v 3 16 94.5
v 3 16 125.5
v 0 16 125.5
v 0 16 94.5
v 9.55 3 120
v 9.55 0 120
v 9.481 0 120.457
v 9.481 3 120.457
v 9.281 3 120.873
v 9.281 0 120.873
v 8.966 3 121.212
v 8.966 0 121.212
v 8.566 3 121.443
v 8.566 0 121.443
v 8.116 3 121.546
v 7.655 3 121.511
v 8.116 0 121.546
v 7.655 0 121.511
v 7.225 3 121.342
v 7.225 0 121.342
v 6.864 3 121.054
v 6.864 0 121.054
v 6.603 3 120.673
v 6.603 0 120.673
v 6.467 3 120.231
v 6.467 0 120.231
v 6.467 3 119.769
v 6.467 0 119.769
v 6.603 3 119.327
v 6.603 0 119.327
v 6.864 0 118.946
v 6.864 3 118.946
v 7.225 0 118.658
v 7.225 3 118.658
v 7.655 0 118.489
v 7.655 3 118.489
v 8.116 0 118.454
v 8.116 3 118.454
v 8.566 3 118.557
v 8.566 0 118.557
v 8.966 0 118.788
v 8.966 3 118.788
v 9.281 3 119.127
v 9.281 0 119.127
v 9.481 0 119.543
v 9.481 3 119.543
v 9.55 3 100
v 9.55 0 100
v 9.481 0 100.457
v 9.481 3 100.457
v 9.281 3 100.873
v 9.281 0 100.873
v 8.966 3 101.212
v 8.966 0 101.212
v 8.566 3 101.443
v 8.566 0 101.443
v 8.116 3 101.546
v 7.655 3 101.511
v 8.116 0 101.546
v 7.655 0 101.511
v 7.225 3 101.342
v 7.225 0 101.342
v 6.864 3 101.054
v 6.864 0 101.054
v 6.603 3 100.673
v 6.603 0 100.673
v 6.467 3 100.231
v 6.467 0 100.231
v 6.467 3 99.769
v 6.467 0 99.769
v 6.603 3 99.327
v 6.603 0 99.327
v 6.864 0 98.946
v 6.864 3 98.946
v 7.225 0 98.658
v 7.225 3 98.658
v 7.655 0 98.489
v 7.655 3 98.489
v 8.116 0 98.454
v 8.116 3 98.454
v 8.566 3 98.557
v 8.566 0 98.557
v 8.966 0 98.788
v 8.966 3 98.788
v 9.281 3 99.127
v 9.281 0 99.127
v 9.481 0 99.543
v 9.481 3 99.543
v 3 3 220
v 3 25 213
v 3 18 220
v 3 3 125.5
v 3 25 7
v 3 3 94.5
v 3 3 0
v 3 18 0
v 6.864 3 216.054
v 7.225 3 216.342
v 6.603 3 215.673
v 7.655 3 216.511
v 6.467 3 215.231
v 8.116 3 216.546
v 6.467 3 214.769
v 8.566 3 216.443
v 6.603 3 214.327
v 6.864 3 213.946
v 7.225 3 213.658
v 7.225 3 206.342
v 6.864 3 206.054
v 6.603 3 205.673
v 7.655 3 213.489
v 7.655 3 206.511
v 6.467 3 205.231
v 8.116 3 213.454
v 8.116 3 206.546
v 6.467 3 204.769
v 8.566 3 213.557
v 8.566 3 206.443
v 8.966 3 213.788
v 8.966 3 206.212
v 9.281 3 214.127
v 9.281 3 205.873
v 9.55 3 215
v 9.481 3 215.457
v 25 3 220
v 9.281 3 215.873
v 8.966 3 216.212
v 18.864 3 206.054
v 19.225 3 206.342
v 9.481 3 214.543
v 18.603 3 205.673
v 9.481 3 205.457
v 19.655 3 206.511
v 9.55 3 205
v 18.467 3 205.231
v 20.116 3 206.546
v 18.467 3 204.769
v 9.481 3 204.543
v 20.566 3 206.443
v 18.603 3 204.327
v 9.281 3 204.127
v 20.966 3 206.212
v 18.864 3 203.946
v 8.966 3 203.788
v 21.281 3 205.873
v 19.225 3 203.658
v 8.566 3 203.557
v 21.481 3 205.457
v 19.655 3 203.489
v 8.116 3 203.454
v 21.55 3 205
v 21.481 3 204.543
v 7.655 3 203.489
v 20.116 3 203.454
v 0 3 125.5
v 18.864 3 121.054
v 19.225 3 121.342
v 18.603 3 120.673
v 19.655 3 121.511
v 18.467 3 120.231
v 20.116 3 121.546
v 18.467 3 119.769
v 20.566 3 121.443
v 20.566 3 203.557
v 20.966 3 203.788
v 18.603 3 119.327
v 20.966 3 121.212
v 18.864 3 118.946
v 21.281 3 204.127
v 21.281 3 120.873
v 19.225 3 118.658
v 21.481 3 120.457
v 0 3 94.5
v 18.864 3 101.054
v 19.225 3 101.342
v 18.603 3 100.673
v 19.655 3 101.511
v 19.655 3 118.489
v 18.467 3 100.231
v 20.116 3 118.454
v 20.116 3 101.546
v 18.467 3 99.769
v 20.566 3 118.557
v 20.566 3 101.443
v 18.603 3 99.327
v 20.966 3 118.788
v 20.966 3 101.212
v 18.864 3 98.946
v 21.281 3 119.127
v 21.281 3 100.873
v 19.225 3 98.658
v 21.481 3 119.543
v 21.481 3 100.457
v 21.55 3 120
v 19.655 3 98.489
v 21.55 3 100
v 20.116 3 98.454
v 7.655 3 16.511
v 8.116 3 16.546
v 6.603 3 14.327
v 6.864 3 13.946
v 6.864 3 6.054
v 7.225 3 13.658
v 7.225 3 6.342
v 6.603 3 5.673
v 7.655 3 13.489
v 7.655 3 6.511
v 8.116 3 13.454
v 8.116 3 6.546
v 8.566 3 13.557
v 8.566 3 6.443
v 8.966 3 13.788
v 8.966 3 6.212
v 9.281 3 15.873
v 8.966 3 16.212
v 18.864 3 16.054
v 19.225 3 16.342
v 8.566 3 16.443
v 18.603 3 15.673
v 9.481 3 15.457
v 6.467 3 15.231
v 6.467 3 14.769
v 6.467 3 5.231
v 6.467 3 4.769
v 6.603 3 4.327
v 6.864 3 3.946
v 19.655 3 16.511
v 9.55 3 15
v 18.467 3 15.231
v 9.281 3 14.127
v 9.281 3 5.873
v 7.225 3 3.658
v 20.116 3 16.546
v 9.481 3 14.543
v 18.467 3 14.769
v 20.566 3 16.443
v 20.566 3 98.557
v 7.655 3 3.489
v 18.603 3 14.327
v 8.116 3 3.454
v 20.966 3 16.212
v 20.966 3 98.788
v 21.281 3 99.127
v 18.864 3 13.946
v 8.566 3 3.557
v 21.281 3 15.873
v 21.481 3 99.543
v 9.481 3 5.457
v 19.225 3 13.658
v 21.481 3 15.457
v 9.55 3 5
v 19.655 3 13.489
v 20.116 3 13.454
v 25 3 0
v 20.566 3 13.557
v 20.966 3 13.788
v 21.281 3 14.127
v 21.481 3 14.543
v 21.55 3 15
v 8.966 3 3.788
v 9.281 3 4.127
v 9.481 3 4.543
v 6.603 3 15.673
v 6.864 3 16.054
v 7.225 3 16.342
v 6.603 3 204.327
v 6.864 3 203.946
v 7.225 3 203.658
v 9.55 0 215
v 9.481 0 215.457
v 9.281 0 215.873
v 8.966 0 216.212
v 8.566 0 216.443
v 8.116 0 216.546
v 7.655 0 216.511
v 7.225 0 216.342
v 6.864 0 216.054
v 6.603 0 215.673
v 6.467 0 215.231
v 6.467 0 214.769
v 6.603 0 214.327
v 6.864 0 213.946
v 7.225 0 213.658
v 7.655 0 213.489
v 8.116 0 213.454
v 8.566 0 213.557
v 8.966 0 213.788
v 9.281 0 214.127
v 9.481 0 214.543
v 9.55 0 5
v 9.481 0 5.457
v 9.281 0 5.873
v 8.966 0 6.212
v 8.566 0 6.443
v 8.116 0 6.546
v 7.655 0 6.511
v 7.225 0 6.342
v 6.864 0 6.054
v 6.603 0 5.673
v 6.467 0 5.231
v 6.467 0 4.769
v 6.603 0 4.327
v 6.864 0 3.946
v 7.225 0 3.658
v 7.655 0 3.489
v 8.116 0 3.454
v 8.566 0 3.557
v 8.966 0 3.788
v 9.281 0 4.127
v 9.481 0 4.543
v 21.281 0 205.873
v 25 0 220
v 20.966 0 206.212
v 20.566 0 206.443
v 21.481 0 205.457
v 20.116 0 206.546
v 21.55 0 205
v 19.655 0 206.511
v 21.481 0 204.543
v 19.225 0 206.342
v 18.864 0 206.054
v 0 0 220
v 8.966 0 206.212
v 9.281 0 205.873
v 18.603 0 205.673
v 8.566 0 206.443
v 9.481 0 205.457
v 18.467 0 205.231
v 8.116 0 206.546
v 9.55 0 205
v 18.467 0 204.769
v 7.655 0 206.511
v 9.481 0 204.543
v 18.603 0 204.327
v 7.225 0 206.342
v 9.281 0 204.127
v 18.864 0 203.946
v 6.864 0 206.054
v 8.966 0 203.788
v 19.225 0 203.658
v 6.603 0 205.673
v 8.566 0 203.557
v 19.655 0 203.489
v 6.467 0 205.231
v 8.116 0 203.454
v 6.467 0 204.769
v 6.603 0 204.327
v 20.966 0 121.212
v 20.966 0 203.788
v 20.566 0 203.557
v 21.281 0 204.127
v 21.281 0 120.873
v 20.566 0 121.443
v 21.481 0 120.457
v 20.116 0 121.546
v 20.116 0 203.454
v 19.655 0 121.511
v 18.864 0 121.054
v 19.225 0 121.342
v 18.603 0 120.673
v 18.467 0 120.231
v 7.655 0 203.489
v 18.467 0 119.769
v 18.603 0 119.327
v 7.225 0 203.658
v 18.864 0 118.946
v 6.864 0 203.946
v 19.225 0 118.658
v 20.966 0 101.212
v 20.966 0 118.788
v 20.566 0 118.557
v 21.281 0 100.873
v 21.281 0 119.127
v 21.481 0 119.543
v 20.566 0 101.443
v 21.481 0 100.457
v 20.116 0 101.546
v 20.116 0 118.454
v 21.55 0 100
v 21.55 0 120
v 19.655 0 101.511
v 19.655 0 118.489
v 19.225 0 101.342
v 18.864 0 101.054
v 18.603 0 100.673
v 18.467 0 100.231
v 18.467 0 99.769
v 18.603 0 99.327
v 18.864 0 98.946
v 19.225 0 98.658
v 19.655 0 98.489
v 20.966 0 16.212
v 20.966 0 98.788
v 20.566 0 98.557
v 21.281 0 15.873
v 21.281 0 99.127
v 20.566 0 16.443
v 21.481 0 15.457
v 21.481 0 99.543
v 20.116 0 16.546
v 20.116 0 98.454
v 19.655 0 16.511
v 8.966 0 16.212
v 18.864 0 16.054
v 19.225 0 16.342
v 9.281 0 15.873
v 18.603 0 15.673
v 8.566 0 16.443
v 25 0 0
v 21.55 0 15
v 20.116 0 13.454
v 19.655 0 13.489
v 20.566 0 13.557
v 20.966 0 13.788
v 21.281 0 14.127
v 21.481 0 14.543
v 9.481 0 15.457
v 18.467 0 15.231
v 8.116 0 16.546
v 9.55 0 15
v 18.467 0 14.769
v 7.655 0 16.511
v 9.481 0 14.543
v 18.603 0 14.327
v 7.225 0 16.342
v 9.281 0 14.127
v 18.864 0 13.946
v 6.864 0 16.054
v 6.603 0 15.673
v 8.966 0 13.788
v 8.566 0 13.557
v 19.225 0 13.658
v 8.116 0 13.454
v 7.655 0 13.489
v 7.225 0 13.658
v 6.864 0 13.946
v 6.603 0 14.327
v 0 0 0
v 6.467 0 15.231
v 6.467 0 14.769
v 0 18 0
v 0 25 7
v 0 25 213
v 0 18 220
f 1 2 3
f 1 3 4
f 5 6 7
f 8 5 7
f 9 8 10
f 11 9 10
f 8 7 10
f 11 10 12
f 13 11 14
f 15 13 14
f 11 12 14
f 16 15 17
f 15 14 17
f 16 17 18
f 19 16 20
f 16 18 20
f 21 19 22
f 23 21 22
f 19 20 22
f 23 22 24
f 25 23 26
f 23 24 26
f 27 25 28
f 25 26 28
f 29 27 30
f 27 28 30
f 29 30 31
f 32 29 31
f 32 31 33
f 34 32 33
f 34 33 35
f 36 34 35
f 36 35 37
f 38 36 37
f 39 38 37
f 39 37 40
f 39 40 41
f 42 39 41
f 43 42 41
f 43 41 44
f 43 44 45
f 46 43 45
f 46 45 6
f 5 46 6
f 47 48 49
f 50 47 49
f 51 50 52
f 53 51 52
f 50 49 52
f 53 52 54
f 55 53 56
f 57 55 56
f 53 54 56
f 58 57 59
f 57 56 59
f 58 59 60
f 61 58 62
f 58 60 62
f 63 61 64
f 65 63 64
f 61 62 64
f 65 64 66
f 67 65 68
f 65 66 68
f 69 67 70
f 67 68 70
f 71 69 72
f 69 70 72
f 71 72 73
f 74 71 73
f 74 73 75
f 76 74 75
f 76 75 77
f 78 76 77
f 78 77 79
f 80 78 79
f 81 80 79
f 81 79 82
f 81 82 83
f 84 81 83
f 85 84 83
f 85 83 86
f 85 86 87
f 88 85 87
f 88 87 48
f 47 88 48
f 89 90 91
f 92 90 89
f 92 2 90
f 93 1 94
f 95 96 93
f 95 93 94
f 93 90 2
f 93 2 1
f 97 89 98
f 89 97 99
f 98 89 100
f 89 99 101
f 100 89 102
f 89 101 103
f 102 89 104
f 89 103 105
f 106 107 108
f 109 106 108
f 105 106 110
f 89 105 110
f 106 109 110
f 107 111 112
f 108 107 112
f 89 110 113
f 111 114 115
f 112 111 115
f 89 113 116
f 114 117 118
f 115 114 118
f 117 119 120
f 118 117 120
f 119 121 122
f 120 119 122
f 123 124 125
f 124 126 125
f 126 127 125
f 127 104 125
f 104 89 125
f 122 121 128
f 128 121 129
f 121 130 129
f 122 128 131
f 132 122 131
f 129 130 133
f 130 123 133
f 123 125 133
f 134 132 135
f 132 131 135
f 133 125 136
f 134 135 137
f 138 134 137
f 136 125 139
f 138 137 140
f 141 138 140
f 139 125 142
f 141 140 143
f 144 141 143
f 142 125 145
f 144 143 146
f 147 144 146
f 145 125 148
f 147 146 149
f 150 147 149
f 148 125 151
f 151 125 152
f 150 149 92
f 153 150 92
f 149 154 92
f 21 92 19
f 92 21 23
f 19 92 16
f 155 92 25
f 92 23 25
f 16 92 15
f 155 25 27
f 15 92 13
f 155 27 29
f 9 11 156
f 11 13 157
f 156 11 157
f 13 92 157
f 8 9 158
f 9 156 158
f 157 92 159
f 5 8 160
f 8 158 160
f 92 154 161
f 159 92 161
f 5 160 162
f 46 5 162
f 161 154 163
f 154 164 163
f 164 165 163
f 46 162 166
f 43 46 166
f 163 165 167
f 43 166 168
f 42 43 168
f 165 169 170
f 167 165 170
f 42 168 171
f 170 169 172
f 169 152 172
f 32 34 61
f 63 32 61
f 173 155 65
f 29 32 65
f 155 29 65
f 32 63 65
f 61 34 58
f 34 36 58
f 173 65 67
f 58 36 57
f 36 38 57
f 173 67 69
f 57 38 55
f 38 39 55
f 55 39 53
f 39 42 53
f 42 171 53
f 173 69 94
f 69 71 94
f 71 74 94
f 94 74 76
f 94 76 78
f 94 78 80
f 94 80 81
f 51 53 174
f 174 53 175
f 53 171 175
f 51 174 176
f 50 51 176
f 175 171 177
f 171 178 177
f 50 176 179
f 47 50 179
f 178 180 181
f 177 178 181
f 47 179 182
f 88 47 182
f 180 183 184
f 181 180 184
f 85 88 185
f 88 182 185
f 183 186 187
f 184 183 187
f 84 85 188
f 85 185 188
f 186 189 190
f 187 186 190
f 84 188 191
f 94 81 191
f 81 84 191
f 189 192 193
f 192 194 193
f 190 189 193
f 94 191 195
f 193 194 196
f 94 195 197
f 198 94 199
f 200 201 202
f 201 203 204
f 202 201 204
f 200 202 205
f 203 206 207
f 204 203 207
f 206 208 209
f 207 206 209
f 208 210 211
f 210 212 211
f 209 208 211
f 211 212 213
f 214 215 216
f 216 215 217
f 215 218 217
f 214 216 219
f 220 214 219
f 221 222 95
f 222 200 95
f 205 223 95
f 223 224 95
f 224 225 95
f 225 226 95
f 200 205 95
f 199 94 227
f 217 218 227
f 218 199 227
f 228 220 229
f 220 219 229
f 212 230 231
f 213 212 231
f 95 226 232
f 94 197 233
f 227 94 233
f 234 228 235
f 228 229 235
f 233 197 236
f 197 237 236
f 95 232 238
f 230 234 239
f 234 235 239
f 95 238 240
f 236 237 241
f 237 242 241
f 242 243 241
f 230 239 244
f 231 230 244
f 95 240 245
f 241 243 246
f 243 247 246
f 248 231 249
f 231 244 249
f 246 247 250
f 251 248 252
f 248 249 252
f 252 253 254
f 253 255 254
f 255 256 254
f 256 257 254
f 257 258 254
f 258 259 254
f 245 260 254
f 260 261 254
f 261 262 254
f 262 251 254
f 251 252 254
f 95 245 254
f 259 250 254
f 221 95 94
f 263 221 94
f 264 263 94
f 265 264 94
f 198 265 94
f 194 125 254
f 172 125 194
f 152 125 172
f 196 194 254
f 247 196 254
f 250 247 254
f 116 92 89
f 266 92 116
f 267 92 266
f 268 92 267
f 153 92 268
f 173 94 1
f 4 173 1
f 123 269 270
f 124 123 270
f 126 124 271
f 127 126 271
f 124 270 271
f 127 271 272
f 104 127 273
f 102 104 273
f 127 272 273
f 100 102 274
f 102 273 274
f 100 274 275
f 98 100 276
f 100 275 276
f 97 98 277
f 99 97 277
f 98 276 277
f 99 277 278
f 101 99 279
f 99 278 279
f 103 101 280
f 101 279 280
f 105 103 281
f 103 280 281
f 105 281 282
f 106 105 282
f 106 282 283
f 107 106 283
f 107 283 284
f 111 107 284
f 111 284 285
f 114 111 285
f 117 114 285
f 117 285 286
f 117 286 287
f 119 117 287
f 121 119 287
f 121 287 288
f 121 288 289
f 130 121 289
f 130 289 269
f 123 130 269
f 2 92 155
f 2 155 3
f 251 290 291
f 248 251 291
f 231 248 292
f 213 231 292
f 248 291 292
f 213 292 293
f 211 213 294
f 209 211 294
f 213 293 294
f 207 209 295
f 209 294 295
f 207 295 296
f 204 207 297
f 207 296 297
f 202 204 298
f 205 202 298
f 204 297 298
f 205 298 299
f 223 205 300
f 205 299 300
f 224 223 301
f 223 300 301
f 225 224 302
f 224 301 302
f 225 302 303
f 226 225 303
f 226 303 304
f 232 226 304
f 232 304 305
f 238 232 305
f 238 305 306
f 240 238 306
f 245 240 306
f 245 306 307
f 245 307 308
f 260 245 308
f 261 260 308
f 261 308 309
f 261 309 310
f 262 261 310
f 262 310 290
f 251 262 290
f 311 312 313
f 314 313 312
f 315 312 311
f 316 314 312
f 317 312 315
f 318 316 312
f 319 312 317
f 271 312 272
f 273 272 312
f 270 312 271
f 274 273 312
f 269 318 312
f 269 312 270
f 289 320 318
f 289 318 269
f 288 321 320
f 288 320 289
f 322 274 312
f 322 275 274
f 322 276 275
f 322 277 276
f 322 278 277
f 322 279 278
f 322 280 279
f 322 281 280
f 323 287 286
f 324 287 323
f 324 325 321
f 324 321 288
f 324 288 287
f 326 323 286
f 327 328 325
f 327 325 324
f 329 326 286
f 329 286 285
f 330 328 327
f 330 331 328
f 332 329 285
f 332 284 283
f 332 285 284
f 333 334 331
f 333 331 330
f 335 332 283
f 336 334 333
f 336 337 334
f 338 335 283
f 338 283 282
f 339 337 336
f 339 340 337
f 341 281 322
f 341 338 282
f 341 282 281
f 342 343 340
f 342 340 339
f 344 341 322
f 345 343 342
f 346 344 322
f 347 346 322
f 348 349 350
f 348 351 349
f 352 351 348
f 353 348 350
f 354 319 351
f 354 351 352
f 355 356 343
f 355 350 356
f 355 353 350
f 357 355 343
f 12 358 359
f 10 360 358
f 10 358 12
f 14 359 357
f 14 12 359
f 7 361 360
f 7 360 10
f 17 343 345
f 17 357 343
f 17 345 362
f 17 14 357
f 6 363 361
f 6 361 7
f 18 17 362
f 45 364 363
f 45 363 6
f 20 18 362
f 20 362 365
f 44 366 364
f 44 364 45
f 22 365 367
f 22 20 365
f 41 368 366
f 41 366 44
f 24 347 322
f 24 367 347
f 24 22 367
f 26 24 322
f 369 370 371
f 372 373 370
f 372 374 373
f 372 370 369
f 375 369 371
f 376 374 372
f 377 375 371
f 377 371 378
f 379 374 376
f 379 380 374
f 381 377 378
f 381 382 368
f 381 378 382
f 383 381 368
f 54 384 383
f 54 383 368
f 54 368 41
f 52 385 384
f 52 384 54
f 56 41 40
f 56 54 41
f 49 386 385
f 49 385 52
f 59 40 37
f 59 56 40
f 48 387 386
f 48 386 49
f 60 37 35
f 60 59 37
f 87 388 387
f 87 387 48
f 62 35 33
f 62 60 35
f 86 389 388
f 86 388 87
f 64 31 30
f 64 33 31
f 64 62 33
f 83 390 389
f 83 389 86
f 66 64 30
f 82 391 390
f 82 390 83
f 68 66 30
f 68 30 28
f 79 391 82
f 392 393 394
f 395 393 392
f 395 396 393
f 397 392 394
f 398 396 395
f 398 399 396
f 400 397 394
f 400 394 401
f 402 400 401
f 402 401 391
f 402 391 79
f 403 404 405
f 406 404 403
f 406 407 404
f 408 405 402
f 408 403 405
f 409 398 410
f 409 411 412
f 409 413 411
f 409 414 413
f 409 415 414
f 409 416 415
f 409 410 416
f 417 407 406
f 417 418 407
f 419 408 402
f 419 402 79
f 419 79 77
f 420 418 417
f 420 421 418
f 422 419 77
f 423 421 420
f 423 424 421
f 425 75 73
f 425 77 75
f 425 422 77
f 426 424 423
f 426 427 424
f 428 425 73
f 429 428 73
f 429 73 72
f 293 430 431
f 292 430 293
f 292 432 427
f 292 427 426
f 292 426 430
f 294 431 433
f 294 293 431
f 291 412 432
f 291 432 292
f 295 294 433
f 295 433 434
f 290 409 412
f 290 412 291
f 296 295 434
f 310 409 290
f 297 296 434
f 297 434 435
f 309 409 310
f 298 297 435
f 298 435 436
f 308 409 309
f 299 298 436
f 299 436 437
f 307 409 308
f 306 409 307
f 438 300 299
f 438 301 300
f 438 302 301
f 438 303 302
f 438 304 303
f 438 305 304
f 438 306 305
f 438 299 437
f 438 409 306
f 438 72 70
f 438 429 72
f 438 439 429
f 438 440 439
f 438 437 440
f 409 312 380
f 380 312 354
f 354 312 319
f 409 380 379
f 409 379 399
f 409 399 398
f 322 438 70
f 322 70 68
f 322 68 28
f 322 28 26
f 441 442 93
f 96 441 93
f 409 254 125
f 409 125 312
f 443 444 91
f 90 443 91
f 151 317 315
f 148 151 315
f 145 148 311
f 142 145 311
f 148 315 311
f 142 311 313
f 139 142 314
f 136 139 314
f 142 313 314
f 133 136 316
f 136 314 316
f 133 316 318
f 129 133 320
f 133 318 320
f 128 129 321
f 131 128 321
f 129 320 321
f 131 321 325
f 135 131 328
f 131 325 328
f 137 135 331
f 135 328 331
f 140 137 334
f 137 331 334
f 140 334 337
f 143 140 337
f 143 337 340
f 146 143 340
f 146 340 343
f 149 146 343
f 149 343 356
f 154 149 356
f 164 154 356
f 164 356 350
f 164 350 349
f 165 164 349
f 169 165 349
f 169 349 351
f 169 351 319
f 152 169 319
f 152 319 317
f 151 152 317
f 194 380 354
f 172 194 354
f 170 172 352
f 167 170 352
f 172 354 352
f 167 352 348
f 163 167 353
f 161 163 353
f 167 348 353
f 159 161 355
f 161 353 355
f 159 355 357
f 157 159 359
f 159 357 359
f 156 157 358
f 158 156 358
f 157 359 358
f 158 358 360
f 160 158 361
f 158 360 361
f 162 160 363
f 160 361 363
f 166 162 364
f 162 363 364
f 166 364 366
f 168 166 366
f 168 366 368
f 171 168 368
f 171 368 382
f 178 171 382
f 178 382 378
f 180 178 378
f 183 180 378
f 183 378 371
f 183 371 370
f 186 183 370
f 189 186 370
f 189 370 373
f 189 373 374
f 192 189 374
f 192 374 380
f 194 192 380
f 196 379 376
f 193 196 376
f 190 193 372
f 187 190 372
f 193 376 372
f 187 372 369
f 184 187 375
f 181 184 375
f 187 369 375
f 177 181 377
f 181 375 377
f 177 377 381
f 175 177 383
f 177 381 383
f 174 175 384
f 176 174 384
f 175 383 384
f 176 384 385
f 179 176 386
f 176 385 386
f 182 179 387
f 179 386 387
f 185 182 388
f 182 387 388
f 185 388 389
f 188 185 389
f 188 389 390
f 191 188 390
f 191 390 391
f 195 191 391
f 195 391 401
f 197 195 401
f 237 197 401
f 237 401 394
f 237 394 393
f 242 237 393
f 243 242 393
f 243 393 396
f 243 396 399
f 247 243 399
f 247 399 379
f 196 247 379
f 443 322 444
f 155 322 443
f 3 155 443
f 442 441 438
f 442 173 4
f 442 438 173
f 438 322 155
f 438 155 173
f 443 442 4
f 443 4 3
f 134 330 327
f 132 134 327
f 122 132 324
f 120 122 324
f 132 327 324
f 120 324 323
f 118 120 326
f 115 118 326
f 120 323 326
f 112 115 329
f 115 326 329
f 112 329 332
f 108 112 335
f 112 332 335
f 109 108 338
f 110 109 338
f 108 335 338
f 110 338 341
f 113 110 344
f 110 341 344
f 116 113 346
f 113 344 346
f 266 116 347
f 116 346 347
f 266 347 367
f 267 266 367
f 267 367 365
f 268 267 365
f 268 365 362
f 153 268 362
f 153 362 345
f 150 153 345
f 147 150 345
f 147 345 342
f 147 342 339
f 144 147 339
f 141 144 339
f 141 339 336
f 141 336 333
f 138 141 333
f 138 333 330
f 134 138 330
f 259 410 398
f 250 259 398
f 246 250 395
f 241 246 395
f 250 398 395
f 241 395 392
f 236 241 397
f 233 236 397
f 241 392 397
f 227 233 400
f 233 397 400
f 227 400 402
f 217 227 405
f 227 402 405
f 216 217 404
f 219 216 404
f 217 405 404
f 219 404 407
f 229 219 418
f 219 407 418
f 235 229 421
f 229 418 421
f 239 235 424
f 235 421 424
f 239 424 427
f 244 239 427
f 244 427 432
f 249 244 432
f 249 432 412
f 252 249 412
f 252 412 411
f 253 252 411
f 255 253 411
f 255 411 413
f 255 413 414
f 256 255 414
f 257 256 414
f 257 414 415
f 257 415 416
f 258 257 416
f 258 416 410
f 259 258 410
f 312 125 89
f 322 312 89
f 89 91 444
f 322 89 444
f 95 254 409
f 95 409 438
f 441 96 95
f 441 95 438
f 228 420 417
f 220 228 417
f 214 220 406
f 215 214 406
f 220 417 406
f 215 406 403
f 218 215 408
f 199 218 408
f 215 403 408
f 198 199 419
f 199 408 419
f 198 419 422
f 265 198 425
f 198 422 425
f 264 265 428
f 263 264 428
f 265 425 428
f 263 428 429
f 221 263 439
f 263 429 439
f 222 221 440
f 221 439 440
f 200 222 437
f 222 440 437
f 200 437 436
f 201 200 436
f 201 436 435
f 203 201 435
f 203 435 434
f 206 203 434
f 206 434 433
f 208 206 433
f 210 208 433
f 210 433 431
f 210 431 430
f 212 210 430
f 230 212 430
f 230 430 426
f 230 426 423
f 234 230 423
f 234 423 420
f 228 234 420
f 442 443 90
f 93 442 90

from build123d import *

# Parameters (mm, degrees)
BOSS_EXTRUDE1_DEPTH = 220
SKETCH2_W           = 31
SKETCH2_H           = 13
CUT_EXTRUDE1_DEPTH  = 10
SKETCH3_R           = 1.55
CUT_EXTRUDE2_DEPTH  = 220
CHAMFER1_SIZE       = 7


with BuildPart() as part:
    # Sketch1 → Boss-Extrude1 (new body)
    with BuildSketch(Plane.XY):
        Polygon((0, 0), (0, 25), (3, 25), (3, 3), (25, 3), (25, 0), align=None)
    extrude(amount=BOSS_EXTRUDE1_DEPTH)

    # Sketch2 → Cut-Extrude1 (cut)
    with BuildSketch(Plane(origin=(3, 0, 0), x_dir=(0, 0, -1), z_dir=(1, 0, 0))):
        with Locations((-110, 9.5)):
            Rectangle(SKETCH2_W, SKETCH2_H)
    extrude(amount=-CUT_EXTRUDE1_DEPTH, mode=Mode.SUBTRACT)

    # Sketch3 → Cut-Extrude2 (cut)
    with BuildSketch(Plane.XZ):
        with Locations((8, 100)):
            Circle(SKETCH3_R)
        with Locations((8, 120)):
            Circle(SKETCH3_R)
        with Locations((8, 215)):
            Circle(SKETCH3_R)
        with Locations((8, 205)):
            Circle(SKETCH3_R)
        with Locations((8, 15)):
            Circle(SKETCH3_R)
        with Locations((8, 5)):
            Circle(SKETCH3_R)
        with Locations((20, 120)):
            Circle(SKETCH3_R)
        with Locations((20, 100)):
            Circle(SKETCH3_R)
        with Locations((20, 15)):
            Circle(SKETCH3_R)
        with Locations((20, 205)):
            Circle(SKETCH3_R)
    extrude(amount=-CUT_EXTRUDE2_DEPTH, mode=Mode.SUBTRACT)

    # Chamfer1
    chamfer1_edges = [part.edges().sort_by_distance(p)[0] for p in [
        (1.5, 25, 220),
        (1.5, 25, 0),
    ]]
    chamfer(chamfer1_edges, length=CHAMFER1_SIZE)


solid = part.part
